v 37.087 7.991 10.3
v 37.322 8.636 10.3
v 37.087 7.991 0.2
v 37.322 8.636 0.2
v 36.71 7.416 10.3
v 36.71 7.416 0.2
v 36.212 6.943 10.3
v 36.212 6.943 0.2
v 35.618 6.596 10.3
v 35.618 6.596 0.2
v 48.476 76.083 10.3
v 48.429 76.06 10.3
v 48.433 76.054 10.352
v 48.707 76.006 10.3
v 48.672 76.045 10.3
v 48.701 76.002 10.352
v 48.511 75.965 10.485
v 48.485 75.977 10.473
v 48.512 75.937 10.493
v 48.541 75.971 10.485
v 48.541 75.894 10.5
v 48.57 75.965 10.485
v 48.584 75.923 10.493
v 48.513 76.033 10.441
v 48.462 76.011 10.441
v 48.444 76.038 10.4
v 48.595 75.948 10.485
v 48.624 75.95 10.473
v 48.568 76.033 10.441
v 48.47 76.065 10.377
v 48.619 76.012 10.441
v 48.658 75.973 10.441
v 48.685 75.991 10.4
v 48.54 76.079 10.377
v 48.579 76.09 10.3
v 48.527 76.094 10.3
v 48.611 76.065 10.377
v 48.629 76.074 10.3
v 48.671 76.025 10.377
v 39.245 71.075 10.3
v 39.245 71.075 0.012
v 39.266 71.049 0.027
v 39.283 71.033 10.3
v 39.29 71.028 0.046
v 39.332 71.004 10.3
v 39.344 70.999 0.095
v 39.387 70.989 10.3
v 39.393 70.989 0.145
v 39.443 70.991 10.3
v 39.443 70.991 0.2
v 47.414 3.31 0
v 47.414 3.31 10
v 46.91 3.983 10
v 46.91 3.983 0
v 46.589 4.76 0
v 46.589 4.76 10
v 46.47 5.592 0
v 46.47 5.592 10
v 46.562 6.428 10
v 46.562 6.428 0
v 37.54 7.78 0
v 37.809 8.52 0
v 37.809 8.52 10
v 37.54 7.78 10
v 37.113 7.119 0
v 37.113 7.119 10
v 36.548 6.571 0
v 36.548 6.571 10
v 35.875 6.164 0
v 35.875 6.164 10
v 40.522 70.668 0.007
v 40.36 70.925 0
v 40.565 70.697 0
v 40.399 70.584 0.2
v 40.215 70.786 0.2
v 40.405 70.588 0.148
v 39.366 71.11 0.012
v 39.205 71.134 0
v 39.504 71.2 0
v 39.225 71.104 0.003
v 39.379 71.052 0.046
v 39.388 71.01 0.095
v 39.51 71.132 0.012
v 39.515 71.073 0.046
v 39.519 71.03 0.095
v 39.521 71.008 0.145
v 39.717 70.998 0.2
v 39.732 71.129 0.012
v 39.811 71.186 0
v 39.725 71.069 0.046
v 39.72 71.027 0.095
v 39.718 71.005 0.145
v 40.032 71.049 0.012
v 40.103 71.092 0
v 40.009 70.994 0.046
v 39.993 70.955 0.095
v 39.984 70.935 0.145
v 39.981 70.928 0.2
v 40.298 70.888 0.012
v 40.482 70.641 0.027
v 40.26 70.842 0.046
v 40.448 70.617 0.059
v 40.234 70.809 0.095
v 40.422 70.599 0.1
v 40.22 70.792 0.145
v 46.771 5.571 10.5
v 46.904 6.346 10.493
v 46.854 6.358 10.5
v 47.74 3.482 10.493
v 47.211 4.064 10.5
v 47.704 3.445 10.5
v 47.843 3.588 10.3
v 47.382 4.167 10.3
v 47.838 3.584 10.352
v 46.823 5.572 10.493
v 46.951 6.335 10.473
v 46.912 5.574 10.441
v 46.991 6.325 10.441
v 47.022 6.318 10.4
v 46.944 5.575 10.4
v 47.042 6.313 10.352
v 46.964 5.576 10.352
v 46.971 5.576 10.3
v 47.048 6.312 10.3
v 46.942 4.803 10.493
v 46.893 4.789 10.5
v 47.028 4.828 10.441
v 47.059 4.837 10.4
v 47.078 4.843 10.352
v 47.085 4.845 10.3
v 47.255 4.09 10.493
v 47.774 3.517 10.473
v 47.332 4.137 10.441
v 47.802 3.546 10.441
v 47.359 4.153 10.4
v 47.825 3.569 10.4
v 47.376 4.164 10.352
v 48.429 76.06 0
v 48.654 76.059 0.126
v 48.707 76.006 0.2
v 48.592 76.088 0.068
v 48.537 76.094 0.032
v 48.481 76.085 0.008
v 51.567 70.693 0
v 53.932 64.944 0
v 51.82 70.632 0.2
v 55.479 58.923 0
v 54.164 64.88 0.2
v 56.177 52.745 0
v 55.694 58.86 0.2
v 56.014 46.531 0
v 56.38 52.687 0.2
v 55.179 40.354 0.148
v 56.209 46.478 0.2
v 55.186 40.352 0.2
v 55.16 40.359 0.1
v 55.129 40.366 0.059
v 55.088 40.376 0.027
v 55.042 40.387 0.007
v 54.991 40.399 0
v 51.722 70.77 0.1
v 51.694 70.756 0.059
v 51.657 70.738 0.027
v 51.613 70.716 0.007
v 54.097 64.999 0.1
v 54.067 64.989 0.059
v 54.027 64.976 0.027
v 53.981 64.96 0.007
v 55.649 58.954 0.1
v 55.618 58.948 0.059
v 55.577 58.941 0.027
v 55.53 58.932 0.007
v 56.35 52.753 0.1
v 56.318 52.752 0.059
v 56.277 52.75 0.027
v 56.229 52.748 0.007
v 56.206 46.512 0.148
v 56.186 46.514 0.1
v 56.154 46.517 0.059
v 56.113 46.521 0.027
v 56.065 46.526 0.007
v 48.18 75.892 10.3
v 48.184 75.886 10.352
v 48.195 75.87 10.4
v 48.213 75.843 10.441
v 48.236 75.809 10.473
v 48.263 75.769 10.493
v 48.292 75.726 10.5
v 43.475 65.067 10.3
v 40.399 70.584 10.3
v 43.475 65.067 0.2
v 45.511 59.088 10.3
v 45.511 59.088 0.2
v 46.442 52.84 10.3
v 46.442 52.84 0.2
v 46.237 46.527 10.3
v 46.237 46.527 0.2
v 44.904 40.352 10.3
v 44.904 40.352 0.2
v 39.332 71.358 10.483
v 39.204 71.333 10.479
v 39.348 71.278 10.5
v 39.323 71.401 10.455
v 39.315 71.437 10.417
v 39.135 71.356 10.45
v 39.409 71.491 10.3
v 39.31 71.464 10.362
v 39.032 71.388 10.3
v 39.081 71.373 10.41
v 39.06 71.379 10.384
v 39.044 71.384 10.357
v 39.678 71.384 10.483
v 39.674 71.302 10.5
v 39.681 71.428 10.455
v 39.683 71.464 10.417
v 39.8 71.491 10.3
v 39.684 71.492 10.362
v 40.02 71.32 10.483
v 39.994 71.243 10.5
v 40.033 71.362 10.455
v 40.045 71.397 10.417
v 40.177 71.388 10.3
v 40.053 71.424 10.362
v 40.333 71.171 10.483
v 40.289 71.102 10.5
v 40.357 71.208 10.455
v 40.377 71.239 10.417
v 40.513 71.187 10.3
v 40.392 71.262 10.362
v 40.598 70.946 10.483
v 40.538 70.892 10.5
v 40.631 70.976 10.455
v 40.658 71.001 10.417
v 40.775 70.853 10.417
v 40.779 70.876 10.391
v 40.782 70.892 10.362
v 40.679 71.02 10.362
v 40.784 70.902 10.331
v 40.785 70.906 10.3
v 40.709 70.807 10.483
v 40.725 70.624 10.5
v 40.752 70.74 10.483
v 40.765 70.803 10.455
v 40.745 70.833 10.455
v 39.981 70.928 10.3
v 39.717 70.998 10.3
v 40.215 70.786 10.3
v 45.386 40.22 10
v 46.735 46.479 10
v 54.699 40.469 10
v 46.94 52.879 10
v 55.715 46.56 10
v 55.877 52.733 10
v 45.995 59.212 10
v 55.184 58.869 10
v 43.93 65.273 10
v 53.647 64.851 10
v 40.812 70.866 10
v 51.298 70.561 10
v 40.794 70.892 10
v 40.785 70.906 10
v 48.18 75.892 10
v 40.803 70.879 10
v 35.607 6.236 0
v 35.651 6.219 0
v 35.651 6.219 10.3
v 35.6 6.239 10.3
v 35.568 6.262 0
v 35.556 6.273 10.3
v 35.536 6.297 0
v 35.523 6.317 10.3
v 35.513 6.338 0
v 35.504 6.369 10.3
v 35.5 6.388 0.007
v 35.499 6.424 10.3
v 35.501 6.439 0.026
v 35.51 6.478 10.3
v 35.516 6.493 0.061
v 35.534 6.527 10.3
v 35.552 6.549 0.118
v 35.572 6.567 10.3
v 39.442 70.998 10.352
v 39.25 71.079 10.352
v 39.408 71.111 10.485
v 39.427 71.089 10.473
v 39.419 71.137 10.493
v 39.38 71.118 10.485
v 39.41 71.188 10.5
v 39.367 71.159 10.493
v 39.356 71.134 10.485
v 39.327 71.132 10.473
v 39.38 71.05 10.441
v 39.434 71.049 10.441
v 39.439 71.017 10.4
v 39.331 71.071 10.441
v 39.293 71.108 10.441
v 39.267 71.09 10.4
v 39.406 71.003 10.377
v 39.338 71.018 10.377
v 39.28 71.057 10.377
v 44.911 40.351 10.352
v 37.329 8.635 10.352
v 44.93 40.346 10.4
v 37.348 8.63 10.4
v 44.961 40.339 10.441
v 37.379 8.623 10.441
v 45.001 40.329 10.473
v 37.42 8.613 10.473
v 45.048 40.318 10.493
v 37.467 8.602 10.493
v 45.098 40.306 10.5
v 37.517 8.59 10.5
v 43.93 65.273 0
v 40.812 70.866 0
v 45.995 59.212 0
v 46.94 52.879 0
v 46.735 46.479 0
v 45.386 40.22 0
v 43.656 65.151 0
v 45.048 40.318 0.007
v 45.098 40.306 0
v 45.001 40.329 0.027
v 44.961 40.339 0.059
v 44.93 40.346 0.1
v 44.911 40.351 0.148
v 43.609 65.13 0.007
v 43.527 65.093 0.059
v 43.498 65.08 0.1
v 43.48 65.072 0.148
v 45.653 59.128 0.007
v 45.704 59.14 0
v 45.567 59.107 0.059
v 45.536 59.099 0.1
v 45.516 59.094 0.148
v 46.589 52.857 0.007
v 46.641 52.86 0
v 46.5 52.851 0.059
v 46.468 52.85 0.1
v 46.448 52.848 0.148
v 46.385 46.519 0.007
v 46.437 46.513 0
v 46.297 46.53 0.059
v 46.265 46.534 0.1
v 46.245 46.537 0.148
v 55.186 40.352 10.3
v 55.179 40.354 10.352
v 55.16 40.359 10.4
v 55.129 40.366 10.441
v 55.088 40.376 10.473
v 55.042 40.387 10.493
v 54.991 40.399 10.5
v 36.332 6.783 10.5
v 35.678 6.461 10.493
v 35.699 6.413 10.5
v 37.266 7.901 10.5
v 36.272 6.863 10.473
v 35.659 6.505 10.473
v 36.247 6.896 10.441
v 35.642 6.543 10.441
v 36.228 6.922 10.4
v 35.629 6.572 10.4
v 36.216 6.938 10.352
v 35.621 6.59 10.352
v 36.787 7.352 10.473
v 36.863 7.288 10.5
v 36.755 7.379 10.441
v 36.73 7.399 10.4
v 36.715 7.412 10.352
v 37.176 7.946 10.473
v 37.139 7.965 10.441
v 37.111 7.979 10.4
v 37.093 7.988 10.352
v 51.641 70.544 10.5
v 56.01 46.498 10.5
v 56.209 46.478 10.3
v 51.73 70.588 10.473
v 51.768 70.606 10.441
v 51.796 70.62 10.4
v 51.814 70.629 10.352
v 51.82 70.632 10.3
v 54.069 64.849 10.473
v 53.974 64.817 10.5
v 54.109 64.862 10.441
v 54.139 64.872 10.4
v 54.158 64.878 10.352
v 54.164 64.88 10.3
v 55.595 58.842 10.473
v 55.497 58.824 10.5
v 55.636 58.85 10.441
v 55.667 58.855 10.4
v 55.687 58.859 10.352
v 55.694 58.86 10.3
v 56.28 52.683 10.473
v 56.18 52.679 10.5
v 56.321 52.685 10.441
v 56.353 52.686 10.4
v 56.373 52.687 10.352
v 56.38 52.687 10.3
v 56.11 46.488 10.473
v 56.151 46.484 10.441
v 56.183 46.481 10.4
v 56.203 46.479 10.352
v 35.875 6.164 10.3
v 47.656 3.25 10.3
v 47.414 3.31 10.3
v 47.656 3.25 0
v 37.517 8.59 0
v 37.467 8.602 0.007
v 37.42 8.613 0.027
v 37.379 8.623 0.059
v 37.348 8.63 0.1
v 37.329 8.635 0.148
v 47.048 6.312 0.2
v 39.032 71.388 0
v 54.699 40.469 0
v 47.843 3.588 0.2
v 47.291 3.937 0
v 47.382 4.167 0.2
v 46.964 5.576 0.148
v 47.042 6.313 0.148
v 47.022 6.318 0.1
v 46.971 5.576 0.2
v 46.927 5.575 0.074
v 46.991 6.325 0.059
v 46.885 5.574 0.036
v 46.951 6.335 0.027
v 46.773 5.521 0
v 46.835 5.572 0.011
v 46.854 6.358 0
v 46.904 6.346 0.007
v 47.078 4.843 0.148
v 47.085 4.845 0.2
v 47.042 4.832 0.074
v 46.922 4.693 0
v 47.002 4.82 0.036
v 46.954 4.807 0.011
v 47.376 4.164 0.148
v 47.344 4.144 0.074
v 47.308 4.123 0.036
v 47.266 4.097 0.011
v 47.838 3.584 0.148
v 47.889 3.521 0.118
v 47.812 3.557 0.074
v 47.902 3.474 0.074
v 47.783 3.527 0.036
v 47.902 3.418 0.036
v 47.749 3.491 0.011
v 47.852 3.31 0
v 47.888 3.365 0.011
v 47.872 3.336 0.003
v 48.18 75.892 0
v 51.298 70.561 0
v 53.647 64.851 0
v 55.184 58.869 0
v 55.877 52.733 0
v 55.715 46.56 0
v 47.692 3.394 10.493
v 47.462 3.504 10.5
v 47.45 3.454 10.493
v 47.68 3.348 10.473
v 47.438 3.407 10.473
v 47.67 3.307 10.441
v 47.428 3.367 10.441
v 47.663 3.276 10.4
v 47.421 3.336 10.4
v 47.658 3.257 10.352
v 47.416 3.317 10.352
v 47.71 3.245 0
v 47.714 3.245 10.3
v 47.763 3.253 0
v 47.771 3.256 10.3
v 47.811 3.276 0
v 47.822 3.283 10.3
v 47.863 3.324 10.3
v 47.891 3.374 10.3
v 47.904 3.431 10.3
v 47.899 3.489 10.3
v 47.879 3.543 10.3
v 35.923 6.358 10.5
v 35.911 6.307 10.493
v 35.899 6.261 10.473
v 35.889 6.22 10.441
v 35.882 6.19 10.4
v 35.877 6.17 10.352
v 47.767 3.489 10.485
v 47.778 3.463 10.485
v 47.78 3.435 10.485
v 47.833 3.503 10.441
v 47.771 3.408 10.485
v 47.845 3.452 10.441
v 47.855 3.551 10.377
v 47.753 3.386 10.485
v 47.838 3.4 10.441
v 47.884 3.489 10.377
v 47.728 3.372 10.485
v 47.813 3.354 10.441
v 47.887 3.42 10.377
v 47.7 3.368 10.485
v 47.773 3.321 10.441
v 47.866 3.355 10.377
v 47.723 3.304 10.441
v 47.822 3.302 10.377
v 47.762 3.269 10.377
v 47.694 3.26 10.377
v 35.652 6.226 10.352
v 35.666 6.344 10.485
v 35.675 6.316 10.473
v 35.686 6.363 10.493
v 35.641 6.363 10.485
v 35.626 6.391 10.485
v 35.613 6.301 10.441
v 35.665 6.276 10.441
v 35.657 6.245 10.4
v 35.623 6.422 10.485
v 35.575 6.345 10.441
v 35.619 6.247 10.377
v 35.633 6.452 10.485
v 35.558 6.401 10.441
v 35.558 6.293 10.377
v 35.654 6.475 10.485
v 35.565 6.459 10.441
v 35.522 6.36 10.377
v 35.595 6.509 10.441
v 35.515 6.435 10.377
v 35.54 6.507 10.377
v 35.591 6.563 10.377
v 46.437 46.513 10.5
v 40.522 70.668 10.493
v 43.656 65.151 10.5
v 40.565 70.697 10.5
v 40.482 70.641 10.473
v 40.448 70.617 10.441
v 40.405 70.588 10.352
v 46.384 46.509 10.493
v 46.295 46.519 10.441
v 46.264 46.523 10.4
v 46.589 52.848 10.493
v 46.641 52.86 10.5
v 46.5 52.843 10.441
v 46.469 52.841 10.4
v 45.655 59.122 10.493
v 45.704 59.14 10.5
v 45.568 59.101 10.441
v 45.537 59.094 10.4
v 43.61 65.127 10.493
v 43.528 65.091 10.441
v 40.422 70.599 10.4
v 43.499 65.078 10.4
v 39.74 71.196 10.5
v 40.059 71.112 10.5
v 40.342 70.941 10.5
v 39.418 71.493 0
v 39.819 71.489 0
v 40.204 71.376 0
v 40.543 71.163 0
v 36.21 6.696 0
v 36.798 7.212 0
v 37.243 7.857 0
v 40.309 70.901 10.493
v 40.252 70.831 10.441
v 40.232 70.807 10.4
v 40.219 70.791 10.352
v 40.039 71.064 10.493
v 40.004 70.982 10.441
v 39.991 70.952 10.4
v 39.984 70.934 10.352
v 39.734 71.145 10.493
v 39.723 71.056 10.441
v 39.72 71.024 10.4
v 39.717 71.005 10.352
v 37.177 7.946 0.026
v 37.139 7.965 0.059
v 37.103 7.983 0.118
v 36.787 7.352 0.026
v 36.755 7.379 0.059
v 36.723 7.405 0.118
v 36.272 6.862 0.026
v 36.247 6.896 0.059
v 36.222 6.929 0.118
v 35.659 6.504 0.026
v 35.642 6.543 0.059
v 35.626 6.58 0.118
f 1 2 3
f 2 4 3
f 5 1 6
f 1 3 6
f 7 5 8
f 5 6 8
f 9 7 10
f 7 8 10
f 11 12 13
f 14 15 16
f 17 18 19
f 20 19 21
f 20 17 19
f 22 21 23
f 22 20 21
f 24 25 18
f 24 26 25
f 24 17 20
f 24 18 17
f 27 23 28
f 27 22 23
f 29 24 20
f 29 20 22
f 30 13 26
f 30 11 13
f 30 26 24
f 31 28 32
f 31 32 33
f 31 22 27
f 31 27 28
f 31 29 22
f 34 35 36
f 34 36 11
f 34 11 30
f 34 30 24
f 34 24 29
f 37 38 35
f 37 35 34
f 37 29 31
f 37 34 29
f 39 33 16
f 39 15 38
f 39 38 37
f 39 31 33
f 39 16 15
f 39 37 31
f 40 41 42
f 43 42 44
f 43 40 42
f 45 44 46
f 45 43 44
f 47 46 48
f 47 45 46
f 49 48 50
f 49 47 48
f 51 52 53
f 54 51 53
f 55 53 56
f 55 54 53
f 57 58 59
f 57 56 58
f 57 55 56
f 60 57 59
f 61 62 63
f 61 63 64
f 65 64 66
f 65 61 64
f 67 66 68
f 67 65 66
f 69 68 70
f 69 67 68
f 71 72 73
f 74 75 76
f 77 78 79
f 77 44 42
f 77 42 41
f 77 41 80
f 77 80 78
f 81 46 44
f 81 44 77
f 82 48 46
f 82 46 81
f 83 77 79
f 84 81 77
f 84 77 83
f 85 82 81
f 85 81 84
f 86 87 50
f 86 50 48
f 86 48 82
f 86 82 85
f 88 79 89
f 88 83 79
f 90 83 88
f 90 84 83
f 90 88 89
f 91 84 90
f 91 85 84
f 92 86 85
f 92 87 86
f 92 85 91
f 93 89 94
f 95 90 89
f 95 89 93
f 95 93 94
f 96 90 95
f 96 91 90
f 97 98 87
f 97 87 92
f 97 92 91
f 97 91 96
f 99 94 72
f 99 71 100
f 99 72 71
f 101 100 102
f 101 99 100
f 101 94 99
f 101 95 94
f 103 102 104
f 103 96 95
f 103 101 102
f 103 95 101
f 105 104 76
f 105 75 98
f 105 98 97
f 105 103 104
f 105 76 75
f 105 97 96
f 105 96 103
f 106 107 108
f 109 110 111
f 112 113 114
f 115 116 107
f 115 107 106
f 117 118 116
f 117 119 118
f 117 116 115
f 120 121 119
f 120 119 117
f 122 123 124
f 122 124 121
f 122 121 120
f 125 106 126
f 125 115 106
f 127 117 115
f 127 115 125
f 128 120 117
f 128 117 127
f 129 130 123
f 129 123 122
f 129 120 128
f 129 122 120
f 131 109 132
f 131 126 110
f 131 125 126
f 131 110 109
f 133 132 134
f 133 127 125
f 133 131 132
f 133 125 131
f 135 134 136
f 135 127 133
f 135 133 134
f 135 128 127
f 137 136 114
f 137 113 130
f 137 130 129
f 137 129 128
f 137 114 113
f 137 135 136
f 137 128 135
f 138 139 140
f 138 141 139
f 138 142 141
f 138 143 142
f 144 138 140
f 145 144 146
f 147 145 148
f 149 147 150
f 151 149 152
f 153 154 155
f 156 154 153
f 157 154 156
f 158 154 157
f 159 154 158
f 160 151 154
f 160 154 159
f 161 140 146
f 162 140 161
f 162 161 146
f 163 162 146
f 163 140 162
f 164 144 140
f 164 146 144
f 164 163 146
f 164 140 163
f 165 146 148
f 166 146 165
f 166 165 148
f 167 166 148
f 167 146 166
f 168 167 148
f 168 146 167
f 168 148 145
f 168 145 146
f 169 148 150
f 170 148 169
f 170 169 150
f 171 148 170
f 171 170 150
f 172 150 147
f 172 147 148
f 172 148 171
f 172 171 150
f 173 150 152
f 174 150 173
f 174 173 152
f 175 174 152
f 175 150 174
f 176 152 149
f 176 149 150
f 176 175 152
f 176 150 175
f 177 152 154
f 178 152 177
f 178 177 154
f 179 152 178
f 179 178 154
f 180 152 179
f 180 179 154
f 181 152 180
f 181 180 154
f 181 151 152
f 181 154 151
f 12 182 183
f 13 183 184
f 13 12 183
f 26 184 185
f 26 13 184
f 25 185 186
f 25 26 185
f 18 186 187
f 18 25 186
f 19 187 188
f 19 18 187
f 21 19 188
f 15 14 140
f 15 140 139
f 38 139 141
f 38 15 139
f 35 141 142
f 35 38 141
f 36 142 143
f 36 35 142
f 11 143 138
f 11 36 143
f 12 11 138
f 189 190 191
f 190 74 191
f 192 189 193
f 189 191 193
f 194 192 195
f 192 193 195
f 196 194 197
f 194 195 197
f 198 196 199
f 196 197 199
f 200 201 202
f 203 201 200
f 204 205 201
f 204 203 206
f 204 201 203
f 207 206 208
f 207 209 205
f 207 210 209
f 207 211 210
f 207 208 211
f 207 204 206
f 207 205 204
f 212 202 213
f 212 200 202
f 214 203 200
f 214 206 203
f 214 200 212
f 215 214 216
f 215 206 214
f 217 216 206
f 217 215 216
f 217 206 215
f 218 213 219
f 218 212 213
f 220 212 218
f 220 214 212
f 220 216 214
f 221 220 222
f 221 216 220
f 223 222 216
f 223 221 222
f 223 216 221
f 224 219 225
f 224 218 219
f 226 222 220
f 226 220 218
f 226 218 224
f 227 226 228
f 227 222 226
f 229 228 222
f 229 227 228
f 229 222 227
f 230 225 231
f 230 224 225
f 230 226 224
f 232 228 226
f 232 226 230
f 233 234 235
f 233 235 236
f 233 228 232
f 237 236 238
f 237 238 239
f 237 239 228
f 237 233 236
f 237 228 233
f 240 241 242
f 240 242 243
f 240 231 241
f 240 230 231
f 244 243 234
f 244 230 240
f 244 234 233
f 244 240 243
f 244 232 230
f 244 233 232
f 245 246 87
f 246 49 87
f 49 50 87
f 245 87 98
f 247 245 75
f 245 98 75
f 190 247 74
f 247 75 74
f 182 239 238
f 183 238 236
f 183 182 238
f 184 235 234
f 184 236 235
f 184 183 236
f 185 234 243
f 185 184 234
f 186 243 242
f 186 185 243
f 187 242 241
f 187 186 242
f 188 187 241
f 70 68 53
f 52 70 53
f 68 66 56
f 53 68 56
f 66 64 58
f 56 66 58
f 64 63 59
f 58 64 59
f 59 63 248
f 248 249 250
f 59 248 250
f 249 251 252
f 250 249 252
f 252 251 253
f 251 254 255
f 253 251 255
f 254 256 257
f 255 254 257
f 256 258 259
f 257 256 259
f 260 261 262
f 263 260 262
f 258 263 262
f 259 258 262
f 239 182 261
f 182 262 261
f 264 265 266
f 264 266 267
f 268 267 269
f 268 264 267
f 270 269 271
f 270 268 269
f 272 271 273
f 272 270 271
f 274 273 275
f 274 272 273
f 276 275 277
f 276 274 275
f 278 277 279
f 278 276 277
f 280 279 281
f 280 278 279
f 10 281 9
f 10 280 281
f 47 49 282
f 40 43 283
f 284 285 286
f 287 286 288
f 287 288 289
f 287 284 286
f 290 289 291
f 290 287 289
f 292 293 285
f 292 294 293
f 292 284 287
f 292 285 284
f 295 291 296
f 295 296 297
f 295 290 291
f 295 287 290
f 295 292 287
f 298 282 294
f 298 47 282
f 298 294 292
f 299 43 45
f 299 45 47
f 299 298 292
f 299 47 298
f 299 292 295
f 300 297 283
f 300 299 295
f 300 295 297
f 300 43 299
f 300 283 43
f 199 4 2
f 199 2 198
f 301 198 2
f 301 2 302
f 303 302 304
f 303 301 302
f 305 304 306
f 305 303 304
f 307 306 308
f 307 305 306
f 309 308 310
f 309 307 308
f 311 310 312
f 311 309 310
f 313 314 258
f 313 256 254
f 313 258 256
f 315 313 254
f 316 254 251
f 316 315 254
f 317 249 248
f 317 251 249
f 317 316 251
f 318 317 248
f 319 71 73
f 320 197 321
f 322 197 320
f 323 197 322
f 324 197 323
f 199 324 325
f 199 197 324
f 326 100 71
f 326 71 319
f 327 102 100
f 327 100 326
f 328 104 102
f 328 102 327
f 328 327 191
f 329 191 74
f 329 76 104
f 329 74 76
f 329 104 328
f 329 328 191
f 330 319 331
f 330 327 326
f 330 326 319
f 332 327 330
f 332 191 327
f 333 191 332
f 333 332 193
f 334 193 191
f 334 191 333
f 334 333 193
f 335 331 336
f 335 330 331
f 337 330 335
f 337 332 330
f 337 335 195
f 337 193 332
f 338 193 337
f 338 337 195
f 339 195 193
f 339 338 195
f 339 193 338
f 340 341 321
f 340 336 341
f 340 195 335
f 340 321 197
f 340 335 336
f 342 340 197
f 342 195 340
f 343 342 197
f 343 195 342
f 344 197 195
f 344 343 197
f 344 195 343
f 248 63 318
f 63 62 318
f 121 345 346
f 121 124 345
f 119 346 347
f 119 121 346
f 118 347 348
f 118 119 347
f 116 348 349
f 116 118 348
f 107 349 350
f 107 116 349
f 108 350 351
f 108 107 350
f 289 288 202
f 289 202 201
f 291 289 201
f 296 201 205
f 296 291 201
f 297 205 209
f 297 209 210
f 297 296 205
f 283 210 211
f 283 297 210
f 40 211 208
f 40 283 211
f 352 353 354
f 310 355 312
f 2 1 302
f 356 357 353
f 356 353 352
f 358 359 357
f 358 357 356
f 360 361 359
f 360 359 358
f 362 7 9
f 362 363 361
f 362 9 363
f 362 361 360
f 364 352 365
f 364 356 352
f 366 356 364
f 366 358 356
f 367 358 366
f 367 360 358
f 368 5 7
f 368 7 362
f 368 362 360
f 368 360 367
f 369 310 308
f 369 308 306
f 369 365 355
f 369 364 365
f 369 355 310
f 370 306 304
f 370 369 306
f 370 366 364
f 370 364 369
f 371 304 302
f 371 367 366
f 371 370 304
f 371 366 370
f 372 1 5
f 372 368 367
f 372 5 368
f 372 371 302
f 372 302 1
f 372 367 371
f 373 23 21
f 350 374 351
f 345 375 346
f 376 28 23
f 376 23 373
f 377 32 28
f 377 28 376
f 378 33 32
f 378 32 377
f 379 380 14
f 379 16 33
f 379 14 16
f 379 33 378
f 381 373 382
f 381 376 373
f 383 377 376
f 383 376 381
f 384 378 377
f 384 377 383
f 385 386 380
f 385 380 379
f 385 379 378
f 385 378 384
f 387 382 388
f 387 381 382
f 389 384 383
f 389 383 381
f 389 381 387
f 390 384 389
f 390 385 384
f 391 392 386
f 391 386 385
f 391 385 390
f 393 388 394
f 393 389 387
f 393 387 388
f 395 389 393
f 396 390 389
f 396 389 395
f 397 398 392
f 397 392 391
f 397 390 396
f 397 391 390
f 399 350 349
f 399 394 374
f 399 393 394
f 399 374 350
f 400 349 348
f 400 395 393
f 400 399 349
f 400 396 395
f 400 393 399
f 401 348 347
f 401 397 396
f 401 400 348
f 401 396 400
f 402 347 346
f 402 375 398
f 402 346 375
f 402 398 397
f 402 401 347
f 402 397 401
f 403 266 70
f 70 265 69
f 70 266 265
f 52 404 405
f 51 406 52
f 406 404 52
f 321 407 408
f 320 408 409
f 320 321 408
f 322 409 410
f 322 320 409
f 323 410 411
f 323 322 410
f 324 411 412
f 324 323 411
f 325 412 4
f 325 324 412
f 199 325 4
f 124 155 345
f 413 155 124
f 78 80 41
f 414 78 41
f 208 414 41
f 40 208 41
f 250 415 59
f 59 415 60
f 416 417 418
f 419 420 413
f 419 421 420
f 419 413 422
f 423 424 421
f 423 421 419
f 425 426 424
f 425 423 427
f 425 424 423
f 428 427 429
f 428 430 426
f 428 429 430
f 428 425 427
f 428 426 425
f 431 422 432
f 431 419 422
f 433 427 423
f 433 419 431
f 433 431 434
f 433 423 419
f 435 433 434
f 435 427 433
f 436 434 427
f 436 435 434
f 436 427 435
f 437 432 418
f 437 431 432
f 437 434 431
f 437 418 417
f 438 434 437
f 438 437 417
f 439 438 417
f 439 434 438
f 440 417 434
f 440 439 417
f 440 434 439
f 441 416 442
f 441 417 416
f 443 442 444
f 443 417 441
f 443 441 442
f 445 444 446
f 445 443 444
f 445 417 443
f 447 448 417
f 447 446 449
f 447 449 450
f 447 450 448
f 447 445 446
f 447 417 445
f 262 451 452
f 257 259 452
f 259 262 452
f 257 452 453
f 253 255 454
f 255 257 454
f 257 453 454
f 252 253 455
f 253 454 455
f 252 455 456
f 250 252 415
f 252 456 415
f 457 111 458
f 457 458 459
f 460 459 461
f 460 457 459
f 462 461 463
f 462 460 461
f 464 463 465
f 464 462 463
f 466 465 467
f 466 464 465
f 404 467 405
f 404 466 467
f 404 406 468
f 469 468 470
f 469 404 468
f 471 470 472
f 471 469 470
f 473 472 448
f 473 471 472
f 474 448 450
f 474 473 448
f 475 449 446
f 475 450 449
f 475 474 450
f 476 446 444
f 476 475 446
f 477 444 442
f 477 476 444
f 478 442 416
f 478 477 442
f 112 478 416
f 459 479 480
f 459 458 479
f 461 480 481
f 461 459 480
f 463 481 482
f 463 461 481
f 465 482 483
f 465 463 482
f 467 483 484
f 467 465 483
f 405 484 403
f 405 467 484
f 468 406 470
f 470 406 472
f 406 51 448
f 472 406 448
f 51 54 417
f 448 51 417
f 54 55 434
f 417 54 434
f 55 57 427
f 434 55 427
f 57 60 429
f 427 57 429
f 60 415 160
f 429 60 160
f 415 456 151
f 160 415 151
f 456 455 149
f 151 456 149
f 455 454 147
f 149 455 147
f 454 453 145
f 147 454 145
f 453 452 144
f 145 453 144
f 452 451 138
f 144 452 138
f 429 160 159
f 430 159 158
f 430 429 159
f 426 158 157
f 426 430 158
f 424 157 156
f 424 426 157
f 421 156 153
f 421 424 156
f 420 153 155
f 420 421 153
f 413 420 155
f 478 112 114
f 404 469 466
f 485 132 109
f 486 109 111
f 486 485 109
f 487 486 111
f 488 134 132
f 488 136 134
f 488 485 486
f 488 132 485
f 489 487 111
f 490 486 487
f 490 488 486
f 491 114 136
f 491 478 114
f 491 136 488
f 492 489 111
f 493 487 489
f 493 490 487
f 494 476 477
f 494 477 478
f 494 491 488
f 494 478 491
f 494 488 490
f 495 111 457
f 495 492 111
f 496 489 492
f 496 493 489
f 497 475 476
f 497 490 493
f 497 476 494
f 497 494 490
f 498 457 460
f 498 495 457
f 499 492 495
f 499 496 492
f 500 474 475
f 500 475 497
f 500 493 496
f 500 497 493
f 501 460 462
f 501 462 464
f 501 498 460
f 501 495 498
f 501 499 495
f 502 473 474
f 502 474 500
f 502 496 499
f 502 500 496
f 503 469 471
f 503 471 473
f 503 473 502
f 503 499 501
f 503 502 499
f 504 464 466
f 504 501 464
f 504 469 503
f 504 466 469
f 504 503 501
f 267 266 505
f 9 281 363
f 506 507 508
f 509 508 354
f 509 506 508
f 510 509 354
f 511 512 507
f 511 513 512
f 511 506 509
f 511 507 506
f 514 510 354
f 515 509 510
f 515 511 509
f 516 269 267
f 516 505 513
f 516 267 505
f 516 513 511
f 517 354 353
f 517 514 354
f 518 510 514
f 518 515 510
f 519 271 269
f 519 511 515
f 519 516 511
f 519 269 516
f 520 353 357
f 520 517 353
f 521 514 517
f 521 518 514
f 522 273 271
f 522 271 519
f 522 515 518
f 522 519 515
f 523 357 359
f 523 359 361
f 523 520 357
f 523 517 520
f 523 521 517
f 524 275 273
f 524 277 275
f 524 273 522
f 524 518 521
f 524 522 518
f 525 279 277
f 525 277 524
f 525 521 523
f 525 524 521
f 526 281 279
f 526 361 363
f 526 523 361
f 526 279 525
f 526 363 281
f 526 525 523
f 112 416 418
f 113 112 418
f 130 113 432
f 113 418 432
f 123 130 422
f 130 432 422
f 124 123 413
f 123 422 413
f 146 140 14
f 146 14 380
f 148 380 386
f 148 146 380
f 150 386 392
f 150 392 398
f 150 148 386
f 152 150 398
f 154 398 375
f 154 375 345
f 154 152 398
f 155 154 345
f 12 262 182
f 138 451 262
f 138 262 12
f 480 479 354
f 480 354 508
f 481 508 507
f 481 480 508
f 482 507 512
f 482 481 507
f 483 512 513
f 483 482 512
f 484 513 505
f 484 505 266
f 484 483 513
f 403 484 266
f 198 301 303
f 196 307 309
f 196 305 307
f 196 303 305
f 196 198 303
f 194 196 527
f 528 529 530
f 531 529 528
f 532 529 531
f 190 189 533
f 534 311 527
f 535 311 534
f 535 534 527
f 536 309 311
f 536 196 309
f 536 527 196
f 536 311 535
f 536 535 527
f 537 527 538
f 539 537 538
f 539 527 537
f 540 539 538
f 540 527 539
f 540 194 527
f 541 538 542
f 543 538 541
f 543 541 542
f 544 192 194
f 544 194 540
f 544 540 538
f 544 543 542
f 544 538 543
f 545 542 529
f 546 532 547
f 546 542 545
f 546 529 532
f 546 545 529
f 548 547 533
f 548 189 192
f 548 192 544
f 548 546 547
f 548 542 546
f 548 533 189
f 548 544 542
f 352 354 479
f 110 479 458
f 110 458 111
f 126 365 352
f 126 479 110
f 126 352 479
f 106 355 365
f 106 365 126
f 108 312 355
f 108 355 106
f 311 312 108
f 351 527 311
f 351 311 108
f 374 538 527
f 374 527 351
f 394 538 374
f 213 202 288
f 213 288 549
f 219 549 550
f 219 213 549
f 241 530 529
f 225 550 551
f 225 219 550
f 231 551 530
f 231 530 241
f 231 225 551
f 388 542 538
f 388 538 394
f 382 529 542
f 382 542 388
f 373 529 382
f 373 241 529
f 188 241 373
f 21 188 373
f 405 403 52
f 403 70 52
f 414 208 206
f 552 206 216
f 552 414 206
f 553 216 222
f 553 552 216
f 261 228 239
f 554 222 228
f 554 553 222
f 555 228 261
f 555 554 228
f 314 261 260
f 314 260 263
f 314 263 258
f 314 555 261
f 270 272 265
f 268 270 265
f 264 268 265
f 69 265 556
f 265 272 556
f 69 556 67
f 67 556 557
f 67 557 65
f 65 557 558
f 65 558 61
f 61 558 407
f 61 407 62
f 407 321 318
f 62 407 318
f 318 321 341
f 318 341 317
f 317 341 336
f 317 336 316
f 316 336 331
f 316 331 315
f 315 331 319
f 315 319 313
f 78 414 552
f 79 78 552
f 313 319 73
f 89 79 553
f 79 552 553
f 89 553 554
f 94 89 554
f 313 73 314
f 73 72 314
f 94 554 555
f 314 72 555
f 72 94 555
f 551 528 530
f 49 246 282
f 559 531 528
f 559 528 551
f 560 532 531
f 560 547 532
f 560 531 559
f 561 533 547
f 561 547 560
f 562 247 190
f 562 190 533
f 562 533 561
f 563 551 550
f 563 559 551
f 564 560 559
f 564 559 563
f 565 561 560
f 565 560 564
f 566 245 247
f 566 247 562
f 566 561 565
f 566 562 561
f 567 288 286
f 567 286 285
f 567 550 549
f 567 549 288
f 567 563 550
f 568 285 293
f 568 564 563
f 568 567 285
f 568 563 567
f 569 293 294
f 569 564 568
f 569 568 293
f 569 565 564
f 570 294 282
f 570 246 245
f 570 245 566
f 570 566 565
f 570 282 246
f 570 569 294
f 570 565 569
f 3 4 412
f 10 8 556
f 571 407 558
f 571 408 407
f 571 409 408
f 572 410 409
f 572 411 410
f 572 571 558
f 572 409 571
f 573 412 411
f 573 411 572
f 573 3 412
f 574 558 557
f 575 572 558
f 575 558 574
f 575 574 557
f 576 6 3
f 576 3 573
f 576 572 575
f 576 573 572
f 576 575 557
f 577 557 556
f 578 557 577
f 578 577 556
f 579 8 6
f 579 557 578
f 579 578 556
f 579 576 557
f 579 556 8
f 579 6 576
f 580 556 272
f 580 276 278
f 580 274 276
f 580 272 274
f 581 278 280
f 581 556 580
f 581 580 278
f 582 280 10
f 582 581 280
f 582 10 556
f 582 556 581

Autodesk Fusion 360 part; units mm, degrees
sketch "Sketch1" plane through (0, 0, 0) normal (0, 0, 1) x (1, 0, 0)
  arc A0 (40.8125, 70.866) -> (39.0316, 71.3876) centre (39.6043, 70.0419) ccw
  arc A1 (40.3994, 70.5843) -> (39.3219, 70.962) centre (39.6043, 70.0419) ccw
  arc A2 (45.3863, 40.2197) -> (40.8125, 70.866) centre (11.4188, 50.8147) ccw
  arc A3 (44.9039, 40.3524) -> (40.3994, 70.5843) centre (11.4188, 50.8147) ccw
  line L0 (37.8087, 8.5202) -> (45.3863, 40.2197)
  line L1 (37.3224, 8.6365) -> (44.9039, 40.3524)
  arc A4 (34.9504, 6.3921) -> (37.3224, 8.6365) centre (34.4176, 9.3308) ccw
  arc A5 (35.8752, 6.1635) -> (37.8087, 8.5202) centre (34.4176, 9.3308) ccw
  arc A6 (46.5621, 6.4278) -> (47.4142, 3.3103) centre (49.8315, 5.6462) ccw
  line L2 (54.6994, 40.4687) -> (46.5621, 6.4278)
  arc A7 (55.1857, 40.3524) -> (48.5945, 76.1714) centre (11.4188, 50.8147) ccw
  line L3 (55.1857, 40.3524) -> (47.0484, 6.3115)
  arc A8 (47.0484, 6.3115) -> (49.4188, 2.8147) centre (49.8315, 5.6462) ccw
  arc A9 (54.6994, 40.4687) -> (48.18, 75.8919) centre (11.4188, 50.8147) ccw
  line L4 (39.0316, 71.3876) -> (39.3219, 70.962)
  line L5 (49.4188, 2.8147) -> (47.4142, 3.3103)
  line L6 (34.9504, 6.3921) -> (35.8752, 6.1635)
  line L7 (35.8752, 6.1635) -> (47.4142, 3.3103)
  line L8 (48.18, 75.8919) -> (48.5945, 76.1714)
  line L9 (48.5945, 76.1714) -> (40.7846, 70.9055)
  dimension "d1" = 35
  dimension "d2" = 10
  dimension "d3" = 0.5
  dimension "d4" = 0.5
extrude "Extrude1" add sketch "Sketch1" along normal blind 10.5 contours A0 A1 A2 A3 L0 L1 A4 A5 L4 L6 | A0 A2 L0 A5 A6 L2 A9 L7 L9 | A6 L2 A7 L3 A8 A9 L5 L8 L9
extrude "Extrude2" cut sketch "Sketch1" along normal blind 10 contours A0 A1 A2 A3 L0 L1 A4 A5 L4 L6 | A0 A2 L0 A5 A6 L2 A9 L7 L9 | A6 L2 A7 L3 A8 A9 L5 L8 L9
extrude "Extrude3" add sketch "Sketch1" along normal blind 10 contours A0 A1 A2 A3 L0 L1 A4 A5 L4 L6 | A6 L2 A7 L3 A8 A9 L5 L8 L9
fillet "Fillet1" radius 0.2 8 faces at (49.046, 29.0055, 10.5) (39.8496, 19.2085, 3.5) (36.0166, 6.8083, 7) (46.4714, 52.2383, 7) (40.0271, 70.9065, 7) (52.4733, 29.0055, 7) (54.7333, 63.0152, 7) (48.3714, 3.1853, 7)
